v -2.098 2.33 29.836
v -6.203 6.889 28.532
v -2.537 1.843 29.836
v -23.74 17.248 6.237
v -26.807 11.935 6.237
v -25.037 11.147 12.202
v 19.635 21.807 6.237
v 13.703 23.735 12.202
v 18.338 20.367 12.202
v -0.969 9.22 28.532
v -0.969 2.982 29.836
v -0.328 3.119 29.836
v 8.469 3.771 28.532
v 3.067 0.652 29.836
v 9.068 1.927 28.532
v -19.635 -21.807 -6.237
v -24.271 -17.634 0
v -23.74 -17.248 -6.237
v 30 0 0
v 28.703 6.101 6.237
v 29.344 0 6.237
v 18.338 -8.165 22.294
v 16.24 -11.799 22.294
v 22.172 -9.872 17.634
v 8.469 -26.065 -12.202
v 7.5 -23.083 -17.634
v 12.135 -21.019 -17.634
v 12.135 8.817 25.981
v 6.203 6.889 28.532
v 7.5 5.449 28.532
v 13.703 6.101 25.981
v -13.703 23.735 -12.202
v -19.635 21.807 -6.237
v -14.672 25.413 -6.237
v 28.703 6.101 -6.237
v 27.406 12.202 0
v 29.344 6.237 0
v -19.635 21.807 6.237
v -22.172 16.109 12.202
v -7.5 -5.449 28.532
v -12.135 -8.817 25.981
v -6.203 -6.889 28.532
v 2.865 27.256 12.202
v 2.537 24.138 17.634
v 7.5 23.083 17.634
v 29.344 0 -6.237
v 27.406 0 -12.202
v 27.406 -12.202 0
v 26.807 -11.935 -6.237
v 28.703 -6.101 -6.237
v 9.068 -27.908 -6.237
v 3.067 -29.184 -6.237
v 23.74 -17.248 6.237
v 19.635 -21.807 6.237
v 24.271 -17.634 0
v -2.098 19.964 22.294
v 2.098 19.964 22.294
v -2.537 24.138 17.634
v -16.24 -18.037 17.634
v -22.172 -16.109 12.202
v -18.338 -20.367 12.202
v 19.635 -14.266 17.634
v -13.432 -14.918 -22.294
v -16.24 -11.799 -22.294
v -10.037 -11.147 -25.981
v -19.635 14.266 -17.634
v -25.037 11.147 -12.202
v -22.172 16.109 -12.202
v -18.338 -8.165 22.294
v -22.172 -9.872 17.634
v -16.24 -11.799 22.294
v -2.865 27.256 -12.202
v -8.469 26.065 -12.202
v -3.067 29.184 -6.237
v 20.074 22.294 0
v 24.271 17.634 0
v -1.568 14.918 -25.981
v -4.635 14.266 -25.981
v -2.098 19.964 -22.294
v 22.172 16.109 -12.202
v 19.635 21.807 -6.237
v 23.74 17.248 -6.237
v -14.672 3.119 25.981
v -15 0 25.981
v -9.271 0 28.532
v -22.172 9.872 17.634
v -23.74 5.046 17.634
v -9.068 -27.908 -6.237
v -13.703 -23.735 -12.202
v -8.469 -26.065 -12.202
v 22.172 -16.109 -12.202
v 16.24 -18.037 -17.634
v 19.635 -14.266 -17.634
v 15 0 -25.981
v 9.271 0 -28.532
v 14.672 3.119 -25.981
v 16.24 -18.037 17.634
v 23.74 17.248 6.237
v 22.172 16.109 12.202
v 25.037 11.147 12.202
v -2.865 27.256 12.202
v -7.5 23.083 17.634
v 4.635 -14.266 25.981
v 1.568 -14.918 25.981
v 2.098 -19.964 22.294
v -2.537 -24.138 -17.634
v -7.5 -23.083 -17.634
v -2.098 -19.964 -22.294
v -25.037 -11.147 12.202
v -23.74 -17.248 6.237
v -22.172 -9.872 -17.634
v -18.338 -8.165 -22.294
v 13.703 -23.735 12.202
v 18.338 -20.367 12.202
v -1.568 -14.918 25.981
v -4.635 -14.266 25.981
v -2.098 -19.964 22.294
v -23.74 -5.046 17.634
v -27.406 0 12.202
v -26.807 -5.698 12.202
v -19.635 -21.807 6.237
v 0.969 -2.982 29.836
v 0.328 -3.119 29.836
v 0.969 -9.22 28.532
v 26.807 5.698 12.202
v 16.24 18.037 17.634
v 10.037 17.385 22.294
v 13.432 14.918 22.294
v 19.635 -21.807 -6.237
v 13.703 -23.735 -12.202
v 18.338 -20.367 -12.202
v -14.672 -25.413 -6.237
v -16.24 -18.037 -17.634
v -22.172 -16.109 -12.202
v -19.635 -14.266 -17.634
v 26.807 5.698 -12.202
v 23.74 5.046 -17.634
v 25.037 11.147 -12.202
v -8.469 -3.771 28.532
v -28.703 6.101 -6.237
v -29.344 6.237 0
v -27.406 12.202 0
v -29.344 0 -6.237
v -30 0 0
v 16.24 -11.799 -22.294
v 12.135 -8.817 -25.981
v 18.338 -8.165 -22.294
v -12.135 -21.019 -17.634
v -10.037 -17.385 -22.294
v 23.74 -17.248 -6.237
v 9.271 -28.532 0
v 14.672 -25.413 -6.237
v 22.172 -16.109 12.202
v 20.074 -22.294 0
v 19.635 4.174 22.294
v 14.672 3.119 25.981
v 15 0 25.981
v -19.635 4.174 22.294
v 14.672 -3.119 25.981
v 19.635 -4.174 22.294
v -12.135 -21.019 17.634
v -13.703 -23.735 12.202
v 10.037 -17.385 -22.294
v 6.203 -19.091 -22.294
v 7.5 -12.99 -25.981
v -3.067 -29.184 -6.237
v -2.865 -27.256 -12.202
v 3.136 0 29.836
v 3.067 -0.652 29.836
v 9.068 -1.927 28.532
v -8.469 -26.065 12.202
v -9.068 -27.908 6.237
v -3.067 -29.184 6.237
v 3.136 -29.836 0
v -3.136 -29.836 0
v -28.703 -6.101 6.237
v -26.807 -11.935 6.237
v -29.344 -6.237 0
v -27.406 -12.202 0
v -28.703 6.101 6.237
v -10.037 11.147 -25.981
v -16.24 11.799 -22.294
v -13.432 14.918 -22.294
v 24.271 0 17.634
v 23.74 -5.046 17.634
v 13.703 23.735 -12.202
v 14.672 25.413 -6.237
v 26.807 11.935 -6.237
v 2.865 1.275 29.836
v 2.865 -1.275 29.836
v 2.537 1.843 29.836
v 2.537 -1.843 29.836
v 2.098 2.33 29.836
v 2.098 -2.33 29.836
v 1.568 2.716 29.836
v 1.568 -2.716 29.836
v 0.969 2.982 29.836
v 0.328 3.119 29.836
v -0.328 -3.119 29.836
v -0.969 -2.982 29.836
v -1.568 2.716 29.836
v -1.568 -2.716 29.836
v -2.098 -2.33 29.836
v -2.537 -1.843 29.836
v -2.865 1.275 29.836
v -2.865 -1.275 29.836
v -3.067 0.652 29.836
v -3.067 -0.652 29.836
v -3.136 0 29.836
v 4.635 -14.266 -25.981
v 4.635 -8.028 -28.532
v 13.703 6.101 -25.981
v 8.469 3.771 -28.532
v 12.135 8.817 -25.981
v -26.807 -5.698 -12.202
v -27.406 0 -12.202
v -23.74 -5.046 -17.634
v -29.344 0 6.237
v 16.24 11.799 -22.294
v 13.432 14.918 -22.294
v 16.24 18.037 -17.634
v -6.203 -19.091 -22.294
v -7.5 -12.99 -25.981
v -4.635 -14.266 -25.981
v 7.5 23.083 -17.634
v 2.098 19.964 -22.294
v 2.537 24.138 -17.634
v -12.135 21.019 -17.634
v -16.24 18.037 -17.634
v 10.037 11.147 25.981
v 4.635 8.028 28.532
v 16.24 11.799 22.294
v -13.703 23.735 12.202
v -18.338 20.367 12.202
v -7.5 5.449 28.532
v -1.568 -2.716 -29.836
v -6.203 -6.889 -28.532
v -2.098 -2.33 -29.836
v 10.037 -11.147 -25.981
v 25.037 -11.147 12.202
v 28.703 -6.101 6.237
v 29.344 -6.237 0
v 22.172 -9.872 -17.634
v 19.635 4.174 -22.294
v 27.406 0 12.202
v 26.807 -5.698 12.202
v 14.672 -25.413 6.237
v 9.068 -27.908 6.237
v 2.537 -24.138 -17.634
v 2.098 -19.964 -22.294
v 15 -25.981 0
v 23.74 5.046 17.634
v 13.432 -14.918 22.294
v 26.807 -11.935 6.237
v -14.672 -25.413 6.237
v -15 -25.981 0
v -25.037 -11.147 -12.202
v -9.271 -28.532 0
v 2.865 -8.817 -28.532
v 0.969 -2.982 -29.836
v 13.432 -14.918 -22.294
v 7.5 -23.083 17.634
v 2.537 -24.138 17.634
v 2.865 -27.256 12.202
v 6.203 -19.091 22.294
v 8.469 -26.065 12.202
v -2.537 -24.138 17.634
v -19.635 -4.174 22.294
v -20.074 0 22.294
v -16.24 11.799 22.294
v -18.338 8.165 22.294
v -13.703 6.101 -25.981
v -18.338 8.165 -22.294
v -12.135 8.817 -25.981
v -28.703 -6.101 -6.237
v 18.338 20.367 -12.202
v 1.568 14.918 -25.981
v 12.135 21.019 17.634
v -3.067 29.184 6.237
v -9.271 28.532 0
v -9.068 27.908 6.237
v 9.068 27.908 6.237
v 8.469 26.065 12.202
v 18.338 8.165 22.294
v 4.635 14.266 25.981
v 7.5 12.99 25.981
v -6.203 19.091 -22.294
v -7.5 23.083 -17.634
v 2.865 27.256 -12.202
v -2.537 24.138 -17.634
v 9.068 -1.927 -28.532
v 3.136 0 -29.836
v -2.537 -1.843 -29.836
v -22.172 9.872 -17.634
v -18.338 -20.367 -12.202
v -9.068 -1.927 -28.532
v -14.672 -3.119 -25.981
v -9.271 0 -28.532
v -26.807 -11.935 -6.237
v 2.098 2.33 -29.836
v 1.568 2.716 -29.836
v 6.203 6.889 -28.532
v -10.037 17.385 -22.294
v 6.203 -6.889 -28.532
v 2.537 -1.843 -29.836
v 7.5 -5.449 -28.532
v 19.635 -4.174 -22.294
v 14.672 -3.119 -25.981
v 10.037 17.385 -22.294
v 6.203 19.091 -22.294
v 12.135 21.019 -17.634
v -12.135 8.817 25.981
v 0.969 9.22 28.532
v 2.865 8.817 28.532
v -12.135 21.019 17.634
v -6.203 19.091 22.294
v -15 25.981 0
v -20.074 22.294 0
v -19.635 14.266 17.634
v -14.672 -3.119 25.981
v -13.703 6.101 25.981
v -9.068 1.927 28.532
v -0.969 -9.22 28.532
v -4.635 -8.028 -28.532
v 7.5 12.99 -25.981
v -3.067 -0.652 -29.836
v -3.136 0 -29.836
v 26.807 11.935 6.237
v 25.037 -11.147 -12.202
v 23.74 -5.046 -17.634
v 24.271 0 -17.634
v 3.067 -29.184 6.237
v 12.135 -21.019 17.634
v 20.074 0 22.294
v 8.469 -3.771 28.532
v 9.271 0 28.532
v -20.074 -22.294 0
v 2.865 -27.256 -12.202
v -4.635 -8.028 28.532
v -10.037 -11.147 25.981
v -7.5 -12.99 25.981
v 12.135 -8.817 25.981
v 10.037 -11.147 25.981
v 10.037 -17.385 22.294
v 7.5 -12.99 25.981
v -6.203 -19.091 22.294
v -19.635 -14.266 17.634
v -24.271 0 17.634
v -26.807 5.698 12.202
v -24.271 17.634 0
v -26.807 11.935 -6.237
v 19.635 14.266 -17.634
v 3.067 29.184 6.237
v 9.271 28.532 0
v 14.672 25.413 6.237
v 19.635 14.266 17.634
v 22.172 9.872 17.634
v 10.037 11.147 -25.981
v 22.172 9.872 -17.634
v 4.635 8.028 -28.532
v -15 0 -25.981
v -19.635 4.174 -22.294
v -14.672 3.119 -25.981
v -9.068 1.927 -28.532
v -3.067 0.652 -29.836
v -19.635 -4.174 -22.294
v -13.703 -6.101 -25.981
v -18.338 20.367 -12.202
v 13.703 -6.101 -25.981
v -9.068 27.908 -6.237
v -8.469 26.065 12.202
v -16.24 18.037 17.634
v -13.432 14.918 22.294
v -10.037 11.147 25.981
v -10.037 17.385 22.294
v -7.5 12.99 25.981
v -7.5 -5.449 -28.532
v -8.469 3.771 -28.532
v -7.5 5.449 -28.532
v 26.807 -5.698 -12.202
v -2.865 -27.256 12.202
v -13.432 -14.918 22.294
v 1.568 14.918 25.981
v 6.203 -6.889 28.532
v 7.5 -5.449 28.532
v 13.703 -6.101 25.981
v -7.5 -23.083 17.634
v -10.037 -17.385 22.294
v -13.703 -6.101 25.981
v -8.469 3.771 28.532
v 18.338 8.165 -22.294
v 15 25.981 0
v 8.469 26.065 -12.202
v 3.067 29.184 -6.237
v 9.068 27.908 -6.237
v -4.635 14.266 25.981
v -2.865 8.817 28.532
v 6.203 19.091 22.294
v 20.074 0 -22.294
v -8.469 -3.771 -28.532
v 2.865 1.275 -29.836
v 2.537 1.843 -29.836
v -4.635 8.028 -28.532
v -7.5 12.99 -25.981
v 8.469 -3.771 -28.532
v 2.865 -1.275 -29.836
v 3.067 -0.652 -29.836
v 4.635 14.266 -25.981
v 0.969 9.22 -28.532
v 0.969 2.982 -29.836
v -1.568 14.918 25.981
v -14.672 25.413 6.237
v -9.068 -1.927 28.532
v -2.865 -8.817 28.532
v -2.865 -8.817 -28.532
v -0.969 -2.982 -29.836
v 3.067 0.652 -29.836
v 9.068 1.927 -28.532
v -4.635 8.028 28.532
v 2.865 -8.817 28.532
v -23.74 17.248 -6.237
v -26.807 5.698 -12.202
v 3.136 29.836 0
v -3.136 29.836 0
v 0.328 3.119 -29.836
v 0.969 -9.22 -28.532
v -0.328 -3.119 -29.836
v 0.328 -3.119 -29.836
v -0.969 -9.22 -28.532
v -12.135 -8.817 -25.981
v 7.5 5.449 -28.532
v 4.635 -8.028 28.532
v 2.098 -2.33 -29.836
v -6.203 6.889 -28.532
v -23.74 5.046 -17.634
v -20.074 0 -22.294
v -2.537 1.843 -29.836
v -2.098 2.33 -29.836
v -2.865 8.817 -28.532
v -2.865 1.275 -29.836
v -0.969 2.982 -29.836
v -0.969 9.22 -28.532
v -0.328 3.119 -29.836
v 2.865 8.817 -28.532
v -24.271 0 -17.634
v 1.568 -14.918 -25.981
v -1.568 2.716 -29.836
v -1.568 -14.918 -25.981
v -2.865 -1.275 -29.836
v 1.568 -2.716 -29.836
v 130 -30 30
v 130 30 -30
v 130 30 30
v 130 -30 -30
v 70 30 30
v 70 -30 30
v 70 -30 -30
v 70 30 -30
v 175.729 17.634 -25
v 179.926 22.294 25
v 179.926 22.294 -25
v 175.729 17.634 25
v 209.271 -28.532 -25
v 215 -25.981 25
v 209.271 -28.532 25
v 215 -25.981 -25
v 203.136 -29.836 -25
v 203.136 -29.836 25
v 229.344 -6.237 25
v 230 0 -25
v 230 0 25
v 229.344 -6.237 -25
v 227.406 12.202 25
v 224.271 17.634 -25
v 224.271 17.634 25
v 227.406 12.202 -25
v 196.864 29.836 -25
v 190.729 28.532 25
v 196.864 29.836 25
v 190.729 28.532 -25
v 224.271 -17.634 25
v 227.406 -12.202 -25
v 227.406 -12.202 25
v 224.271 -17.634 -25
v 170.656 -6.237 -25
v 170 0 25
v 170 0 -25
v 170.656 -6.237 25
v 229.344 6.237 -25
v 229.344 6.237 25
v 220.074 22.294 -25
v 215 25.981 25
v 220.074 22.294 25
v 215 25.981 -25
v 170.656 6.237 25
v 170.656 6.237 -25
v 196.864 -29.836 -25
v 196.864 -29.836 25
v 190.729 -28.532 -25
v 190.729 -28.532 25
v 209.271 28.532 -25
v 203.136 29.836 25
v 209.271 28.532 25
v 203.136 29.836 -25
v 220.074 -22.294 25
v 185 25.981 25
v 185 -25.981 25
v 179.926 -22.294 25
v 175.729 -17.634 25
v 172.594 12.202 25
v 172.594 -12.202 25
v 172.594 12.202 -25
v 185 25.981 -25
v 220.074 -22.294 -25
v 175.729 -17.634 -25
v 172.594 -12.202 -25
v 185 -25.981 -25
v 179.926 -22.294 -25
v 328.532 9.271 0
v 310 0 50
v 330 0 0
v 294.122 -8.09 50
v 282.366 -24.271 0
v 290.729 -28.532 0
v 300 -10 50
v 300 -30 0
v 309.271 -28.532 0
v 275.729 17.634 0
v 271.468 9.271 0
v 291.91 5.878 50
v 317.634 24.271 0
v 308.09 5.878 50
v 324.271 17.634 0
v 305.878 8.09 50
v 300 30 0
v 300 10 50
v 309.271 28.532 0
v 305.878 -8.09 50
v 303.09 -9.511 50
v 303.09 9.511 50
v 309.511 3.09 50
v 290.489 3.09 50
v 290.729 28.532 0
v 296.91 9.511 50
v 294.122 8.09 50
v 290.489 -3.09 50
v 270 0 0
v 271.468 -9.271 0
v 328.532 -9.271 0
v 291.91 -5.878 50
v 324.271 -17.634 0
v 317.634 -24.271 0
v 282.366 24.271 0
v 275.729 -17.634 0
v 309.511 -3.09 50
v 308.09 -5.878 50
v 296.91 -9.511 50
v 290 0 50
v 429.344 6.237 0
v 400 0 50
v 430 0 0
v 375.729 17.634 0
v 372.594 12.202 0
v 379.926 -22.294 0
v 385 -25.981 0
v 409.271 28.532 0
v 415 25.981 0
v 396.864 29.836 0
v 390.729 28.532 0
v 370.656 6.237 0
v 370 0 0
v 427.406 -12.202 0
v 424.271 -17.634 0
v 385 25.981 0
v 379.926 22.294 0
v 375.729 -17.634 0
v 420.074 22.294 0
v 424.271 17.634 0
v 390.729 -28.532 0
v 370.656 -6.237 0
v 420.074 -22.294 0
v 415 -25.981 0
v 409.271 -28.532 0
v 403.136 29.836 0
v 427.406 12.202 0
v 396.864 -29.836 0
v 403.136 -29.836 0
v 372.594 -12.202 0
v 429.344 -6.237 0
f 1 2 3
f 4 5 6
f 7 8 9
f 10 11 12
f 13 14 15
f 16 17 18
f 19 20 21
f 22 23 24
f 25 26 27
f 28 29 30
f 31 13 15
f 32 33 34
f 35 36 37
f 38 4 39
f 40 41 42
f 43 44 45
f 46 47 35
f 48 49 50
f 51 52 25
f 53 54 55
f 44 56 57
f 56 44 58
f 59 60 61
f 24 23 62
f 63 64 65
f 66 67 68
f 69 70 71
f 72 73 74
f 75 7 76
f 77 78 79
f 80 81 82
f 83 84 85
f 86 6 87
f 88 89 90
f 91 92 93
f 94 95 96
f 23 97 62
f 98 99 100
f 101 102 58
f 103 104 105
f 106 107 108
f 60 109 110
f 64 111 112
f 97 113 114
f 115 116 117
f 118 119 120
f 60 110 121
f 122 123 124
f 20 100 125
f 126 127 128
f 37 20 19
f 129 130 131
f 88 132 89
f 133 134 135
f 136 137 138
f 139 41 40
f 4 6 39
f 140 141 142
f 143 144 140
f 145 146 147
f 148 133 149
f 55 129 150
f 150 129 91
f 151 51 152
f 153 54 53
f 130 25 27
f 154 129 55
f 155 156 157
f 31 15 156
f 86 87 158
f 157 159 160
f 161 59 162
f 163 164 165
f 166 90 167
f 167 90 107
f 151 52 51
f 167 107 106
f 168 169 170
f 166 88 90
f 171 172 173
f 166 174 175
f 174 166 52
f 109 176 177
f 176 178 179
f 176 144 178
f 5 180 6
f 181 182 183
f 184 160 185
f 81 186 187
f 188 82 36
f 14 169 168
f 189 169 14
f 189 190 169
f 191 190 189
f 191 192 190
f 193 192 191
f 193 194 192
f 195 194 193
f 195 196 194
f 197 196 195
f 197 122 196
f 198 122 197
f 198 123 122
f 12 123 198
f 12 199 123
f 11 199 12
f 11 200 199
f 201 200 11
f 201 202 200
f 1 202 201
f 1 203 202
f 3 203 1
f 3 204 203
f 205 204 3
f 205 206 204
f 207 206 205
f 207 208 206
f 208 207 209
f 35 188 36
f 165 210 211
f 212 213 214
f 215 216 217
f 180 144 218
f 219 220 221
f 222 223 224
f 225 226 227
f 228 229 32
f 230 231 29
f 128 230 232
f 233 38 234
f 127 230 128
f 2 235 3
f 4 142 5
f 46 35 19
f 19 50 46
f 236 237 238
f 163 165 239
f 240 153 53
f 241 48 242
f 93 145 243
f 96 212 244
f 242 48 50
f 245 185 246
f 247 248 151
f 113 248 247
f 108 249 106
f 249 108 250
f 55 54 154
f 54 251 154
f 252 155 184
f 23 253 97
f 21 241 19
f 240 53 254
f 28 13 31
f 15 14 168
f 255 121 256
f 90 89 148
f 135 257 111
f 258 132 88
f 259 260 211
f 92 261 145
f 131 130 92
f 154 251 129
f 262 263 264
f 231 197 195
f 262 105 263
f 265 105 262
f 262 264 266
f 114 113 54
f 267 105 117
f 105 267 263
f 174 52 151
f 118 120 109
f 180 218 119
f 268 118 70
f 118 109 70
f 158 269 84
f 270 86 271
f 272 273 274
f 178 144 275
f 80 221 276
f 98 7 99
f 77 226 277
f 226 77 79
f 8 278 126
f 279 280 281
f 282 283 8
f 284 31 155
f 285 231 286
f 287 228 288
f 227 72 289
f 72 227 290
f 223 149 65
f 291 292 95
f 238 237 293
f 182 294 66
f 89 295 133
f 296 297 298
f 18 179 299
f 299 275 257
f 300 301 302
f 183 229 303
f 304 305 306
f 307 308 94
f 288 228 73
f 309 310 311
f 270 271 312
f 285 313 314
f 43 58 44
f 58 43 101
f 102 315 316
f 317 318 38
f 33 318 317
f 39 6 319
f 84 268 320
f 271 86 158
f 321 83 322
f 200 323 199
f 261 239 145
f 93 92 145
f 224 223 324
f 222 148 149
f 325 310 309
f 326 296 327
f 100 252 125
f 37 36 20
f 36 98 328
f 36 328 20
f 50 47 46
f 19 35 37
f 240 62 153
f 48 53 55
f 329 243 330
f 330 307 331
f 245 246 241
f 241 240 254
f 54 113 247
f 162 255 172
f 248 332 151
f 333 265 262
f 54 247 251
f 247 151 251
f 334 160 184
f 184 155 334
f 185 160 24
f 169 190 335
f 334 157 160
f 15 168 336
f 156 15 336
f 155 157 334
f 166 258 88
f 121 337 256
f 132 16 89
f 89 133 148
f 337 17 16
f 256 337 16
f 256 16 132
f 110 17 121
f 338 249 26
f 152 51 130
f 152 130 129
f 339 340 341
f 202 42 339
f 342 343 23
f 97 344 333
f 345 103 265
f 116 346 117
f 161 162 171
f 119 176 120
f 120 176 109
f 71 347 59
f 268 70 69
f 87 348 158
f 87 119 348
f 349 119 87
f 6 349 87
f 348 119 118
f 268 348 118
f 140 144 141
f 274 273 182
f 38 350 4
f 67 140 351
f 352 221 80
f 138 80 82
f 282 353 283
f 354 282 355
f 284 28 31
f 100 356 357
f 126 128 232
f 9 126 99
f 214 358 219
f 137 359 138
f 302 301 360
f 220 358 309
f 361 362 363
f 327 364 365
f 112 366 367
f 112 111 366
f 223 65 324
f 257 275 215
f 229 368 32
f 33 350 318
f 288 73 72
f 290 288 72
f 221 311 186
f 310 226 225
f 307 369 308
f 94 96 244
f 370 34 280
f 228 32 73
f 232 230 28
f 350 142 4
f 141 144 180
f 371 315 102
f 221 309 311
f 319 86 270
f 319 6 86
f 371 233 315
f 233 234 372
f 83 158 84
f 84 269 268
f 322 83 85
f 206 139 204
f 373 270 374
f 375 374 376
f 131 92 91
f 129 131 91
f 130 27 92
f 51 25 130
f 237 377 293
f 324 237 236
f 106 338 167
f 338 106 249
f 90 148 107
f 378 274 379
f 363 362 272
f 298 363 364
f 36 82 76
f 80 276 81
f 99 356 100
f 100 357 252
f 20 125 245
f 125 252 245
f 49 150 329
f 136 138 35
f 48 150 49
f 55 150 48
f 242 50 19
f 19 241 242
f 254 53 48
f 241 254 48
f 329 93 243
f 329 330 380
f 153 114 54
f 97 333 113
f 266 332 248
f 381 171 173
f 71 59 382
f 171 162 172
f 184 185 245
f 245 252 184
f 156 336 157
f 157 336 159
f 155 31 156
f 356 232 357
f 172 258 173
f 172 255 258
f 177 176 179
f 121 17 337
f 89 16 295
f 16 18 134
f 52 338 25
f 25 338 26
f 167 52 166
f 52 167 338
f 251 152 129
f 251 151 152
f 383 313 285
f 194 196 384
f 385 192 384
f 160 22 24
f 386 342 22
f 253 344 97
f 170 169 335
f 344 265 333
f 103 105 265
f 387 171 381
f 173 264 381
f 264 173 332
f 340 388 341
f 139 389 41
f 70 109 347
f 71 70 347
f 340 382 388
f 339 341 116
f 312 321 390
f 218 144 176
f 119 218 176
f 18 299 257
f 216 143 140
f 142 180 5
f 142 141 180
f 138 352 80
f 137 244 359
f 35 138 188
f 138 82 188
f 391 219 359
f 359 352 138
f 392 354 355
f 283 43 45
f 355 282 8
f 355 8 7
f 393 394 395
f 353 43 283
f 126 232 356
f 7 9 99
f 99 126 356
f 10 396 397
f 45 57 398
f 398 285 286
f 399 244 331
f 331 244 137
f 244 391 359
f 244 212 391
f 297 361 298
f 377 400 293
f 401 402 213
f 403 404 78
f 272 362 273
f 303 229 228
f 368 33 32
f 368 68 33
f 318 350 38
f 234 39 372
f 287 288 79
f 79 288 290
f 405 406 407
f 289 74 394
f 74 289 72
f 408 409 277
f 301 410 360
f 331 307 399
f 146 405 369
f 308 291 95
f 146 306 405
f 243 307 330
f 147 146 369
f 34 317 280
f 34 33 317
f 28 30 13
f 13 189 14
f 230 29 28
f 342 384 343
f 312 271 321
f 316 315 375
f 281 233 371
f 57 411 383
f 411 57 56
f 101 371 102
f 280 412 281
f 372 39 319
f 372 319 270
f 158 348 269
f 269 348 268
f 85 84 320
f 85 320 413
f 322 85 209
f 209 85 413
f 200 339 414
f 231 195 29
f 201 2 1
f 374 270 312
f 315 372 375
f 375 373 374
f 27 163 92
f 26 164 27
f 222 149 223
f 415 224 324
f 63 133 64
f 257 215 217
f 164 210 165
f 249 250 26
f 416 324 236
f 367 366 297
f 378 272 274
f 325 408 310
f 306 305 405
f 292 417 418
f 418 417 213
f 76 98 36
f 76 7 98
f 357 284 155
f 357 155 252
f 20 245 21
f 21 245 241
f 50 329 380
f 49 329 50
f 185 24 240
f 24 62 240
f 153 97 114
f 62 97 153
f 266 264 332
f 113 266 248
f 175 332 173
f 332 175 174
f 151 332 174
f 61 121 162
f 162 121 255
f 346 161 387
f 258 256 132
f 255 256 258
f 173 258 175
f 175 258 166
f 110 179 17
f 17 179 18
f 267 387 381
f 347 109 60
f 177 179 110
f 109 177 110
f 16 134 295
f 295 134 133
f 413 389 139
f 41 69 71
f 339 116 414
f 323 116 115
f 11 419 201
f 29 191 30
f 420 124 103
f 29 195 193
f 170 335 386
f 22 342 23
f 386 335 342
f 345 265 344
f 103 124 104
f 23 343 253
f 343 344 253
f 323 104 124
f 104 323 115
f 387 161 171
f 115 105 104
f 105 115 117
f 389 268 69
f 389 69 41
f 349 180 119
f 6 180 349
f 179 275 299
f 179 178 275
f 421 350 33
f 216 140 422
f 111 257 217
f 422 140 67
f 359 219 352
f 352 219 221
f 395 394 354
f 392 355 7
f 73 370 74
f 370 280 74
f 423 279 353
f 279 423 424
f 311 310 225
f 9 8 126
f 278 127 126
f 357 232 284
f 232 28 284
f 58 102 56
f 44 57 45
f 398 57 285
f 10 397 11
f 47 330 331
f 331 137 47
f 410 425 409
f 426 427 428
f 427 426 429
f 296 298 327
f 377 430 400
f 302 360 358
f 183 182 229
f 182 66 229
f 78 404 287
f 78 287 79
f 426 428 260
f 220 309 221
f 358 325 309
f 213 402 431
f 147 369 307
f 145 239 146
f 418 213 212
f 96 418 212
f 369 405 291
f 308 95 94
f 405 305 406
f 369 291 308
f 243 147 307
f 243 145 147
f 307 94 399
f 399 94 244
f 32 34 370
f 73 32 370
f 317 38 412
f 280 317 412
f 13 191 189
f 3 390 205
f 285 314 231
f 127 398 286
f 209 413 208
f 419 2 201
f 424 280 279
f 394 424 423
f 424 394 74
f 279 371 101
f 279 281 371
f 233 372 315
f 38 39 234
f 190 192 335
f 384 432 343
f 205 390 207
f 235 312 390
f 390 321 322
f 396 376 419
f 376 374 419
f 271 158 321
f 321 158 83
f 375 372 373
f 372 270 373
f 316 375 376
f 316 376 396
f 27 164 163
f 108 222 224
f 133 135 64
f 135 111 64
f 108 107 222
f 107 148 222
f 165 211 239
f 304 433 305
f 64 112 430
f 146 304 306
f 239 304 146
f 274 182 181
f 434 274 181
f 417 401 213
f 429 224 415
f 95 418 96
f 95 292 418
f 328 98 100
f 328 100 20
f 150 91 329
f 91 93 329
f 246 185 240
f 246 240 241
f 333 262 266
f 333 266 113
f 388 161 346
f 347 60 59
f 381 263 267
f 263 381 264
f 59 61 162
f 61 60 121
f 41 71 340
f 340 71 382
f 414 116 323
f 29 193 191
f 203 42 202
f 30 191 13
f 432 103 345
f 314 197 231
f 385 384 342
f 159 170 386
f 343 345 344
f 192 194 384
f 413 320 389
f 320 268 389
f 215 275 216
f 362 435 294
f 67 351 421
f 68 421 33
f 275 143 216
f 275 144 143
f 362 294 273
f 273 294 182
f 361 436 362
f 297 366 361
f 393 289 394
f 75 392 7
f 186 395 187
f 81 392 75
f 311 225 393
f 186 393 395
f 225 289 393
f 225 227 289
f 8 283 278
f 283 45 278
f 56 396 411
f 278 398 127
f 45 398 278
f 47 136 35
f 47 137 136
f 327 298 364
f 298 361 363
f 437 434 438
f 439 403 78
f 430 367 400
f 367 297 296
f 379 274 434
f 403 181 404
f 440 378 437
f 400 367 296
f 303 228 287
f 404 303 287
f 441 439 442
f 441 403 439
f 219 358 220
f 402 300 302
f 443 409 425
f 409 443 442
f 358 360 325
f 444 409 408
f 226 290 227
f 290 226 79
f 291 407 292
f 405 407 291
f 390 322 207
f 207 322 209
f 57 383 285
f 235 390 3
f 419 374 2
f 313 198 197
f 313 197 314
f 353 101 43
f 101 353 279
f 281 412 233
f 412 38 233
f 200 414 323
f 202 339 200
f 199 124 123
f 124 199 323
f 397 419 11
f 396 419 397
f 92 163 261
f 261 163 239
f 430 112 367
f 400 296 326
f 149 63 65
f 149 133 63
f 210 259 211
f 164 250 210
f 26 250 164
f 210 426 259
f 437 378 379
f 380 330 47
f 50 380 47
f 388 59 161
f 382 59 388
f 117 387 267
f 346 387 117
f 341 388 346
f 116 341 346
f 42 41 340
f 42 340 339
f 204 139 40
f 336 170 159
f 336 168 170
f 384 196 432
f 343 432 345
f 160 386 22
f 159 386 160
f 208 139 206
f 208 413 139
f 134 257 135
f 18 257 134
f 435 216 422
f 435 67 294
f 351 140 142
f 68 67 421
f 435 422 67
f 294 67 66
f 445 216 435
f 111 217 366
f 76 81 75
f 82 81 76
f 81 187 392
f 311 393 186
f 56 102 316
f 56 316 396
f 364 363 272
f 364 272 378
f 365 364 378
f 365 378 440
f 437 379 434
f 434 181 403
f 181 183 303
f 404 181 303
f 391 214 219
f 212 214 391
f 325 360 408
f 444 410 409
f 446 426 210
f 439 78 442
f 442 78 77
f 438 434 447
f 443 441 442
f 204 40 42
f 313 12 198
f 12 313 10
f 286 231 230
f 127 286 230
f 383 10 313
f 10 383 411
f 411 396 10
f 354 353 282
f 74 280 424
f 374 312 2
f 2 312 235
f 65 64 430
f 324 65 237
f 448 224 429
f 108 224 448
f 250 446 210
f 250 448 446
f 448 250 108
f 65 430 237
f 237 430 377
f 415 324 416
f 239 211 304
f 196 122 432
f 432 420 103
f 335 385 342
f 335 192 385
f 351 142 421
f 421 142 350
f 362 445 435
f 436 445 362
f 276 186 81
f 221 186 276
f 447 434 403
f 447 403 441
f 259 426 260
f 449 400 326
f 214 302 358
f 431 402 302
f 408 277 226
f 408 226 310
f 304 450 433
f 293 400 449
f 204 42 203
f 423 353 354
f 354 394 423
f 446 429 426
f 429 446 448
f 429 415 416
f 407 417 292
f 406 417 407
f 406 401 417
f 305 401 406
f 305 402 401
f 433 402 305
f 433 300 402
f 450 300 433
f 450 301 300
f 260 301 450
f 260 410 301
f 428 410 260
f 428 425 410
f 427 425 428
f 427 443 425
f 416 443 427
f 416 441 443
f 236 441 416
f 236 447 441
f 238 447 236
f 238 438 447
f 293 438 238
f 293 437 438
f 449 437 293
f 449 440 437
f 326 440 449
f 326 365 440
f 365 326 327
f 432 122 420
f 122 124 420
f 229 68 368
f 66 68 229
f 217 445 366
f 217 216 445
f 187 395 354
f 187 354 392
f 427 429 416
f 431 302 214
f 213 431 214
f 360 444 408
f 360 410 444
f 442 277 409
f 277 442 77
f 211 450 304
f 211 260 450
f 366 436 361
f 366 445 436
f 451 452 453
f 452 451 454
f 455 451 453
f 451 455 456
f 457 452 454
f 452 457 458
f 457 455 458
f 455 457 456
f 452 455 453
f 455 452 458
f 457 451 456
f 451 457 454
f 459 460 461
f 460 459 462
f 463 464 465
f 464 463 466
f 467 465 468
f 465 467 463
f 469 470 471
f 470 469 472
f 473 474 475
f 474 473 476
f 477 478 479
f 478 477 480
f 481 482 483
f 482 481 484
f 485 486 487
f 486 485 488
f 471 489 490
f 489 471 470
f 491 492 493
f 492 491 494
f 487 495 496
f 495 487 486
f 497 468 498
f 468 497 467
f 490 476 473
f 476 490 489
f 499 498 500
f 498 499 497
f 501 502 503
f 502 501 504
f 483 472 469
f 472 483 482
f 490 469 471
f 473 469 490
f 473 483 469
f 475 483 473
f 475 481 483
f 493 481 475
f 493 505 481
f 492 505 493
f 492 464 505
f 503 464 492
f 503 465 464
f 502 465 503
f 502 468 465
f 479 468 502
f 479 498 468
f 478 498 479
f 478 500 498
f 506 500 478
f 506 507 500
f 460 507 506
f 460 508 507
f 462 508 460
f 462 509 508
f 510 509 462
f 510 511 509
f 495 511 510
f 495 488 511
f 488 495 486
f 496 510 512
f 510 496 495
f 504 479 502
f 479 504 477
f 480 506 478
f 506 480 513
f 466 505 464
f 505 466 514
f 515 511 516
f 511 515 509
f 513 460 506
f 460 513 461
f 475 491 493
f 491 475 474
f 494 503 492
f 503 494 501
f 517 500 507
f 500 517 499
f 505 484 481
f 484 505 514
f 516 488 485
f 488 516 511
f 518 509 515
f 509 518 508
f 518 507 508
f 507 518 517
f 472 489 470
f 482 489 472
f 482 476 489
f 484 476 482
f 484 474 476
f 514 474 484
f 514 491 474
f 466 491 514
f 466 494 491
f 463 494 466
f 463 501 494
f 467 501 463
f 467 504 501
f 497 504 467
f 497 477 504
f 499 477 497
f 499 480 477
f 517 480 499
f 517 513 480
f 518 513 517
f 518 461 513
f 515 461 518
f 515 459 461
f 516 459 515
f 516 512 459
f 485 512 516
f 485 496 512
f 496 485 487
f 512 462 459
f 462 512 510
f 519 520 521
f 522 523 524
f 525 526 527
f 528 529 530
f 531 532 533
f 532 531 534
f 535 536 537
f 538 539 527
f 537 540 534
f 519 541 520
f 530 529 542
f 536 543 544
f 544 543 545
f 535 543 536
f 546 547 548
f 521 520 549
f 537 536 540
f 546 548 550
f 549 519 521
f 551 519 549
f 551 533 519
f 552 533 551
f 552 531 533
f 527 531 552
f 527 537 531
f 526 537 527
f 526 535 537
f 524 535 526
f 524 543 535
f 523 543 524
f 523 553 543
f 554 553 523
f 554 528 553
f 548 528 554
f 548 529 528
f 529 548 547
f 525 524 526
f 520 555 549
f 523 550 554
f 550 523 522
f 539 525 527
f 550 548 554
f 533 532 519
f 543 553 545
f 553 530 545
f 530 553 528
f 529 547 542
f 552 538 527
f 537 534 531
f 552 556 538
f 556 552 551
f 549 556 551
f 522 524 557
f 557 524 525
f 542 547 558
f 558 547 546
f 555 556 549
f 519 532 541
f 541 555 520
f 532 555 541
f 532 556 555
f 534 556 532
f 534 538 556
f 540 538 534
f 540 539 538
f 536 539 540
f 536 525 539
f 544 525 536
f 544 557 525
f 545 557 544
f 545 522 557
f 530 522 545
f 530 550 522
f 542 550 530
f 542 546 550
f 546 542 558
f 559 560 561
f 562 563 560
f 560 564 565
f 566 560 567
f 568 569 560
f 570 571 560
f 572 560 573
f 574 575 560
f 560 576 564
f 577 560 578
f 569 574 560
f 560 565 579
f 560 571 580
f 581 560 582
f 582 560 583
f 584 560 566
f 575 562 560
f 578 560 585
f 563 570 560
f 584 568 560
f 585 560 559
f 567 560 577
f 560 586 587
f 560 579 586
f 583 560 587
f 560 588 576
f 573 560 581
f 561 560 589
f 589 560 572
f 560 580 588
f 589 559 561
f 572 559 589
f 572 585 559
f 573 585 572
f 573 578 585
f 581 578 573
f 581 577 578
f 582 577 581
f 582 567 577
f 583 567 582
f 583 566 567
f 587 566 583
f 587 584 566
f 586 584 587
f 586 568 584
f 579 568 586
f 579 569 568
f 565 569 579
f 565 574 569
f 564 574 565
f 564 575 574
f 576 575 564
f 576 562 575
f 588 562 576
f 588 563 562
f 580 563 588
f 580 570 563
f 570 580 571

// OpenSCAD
sphere(30);
translate([100, 0, 0]) cube(60, center=true);
translate([200, 0, 0]) cylinder(r=30,  h=50, center=true);
translate([300, 0, 0]) cylinder(r1=30, r2=10, h=50, $fn=20);
translate([400, 0, 0]) cylinder(r1=30, r2=0,  h=50);
